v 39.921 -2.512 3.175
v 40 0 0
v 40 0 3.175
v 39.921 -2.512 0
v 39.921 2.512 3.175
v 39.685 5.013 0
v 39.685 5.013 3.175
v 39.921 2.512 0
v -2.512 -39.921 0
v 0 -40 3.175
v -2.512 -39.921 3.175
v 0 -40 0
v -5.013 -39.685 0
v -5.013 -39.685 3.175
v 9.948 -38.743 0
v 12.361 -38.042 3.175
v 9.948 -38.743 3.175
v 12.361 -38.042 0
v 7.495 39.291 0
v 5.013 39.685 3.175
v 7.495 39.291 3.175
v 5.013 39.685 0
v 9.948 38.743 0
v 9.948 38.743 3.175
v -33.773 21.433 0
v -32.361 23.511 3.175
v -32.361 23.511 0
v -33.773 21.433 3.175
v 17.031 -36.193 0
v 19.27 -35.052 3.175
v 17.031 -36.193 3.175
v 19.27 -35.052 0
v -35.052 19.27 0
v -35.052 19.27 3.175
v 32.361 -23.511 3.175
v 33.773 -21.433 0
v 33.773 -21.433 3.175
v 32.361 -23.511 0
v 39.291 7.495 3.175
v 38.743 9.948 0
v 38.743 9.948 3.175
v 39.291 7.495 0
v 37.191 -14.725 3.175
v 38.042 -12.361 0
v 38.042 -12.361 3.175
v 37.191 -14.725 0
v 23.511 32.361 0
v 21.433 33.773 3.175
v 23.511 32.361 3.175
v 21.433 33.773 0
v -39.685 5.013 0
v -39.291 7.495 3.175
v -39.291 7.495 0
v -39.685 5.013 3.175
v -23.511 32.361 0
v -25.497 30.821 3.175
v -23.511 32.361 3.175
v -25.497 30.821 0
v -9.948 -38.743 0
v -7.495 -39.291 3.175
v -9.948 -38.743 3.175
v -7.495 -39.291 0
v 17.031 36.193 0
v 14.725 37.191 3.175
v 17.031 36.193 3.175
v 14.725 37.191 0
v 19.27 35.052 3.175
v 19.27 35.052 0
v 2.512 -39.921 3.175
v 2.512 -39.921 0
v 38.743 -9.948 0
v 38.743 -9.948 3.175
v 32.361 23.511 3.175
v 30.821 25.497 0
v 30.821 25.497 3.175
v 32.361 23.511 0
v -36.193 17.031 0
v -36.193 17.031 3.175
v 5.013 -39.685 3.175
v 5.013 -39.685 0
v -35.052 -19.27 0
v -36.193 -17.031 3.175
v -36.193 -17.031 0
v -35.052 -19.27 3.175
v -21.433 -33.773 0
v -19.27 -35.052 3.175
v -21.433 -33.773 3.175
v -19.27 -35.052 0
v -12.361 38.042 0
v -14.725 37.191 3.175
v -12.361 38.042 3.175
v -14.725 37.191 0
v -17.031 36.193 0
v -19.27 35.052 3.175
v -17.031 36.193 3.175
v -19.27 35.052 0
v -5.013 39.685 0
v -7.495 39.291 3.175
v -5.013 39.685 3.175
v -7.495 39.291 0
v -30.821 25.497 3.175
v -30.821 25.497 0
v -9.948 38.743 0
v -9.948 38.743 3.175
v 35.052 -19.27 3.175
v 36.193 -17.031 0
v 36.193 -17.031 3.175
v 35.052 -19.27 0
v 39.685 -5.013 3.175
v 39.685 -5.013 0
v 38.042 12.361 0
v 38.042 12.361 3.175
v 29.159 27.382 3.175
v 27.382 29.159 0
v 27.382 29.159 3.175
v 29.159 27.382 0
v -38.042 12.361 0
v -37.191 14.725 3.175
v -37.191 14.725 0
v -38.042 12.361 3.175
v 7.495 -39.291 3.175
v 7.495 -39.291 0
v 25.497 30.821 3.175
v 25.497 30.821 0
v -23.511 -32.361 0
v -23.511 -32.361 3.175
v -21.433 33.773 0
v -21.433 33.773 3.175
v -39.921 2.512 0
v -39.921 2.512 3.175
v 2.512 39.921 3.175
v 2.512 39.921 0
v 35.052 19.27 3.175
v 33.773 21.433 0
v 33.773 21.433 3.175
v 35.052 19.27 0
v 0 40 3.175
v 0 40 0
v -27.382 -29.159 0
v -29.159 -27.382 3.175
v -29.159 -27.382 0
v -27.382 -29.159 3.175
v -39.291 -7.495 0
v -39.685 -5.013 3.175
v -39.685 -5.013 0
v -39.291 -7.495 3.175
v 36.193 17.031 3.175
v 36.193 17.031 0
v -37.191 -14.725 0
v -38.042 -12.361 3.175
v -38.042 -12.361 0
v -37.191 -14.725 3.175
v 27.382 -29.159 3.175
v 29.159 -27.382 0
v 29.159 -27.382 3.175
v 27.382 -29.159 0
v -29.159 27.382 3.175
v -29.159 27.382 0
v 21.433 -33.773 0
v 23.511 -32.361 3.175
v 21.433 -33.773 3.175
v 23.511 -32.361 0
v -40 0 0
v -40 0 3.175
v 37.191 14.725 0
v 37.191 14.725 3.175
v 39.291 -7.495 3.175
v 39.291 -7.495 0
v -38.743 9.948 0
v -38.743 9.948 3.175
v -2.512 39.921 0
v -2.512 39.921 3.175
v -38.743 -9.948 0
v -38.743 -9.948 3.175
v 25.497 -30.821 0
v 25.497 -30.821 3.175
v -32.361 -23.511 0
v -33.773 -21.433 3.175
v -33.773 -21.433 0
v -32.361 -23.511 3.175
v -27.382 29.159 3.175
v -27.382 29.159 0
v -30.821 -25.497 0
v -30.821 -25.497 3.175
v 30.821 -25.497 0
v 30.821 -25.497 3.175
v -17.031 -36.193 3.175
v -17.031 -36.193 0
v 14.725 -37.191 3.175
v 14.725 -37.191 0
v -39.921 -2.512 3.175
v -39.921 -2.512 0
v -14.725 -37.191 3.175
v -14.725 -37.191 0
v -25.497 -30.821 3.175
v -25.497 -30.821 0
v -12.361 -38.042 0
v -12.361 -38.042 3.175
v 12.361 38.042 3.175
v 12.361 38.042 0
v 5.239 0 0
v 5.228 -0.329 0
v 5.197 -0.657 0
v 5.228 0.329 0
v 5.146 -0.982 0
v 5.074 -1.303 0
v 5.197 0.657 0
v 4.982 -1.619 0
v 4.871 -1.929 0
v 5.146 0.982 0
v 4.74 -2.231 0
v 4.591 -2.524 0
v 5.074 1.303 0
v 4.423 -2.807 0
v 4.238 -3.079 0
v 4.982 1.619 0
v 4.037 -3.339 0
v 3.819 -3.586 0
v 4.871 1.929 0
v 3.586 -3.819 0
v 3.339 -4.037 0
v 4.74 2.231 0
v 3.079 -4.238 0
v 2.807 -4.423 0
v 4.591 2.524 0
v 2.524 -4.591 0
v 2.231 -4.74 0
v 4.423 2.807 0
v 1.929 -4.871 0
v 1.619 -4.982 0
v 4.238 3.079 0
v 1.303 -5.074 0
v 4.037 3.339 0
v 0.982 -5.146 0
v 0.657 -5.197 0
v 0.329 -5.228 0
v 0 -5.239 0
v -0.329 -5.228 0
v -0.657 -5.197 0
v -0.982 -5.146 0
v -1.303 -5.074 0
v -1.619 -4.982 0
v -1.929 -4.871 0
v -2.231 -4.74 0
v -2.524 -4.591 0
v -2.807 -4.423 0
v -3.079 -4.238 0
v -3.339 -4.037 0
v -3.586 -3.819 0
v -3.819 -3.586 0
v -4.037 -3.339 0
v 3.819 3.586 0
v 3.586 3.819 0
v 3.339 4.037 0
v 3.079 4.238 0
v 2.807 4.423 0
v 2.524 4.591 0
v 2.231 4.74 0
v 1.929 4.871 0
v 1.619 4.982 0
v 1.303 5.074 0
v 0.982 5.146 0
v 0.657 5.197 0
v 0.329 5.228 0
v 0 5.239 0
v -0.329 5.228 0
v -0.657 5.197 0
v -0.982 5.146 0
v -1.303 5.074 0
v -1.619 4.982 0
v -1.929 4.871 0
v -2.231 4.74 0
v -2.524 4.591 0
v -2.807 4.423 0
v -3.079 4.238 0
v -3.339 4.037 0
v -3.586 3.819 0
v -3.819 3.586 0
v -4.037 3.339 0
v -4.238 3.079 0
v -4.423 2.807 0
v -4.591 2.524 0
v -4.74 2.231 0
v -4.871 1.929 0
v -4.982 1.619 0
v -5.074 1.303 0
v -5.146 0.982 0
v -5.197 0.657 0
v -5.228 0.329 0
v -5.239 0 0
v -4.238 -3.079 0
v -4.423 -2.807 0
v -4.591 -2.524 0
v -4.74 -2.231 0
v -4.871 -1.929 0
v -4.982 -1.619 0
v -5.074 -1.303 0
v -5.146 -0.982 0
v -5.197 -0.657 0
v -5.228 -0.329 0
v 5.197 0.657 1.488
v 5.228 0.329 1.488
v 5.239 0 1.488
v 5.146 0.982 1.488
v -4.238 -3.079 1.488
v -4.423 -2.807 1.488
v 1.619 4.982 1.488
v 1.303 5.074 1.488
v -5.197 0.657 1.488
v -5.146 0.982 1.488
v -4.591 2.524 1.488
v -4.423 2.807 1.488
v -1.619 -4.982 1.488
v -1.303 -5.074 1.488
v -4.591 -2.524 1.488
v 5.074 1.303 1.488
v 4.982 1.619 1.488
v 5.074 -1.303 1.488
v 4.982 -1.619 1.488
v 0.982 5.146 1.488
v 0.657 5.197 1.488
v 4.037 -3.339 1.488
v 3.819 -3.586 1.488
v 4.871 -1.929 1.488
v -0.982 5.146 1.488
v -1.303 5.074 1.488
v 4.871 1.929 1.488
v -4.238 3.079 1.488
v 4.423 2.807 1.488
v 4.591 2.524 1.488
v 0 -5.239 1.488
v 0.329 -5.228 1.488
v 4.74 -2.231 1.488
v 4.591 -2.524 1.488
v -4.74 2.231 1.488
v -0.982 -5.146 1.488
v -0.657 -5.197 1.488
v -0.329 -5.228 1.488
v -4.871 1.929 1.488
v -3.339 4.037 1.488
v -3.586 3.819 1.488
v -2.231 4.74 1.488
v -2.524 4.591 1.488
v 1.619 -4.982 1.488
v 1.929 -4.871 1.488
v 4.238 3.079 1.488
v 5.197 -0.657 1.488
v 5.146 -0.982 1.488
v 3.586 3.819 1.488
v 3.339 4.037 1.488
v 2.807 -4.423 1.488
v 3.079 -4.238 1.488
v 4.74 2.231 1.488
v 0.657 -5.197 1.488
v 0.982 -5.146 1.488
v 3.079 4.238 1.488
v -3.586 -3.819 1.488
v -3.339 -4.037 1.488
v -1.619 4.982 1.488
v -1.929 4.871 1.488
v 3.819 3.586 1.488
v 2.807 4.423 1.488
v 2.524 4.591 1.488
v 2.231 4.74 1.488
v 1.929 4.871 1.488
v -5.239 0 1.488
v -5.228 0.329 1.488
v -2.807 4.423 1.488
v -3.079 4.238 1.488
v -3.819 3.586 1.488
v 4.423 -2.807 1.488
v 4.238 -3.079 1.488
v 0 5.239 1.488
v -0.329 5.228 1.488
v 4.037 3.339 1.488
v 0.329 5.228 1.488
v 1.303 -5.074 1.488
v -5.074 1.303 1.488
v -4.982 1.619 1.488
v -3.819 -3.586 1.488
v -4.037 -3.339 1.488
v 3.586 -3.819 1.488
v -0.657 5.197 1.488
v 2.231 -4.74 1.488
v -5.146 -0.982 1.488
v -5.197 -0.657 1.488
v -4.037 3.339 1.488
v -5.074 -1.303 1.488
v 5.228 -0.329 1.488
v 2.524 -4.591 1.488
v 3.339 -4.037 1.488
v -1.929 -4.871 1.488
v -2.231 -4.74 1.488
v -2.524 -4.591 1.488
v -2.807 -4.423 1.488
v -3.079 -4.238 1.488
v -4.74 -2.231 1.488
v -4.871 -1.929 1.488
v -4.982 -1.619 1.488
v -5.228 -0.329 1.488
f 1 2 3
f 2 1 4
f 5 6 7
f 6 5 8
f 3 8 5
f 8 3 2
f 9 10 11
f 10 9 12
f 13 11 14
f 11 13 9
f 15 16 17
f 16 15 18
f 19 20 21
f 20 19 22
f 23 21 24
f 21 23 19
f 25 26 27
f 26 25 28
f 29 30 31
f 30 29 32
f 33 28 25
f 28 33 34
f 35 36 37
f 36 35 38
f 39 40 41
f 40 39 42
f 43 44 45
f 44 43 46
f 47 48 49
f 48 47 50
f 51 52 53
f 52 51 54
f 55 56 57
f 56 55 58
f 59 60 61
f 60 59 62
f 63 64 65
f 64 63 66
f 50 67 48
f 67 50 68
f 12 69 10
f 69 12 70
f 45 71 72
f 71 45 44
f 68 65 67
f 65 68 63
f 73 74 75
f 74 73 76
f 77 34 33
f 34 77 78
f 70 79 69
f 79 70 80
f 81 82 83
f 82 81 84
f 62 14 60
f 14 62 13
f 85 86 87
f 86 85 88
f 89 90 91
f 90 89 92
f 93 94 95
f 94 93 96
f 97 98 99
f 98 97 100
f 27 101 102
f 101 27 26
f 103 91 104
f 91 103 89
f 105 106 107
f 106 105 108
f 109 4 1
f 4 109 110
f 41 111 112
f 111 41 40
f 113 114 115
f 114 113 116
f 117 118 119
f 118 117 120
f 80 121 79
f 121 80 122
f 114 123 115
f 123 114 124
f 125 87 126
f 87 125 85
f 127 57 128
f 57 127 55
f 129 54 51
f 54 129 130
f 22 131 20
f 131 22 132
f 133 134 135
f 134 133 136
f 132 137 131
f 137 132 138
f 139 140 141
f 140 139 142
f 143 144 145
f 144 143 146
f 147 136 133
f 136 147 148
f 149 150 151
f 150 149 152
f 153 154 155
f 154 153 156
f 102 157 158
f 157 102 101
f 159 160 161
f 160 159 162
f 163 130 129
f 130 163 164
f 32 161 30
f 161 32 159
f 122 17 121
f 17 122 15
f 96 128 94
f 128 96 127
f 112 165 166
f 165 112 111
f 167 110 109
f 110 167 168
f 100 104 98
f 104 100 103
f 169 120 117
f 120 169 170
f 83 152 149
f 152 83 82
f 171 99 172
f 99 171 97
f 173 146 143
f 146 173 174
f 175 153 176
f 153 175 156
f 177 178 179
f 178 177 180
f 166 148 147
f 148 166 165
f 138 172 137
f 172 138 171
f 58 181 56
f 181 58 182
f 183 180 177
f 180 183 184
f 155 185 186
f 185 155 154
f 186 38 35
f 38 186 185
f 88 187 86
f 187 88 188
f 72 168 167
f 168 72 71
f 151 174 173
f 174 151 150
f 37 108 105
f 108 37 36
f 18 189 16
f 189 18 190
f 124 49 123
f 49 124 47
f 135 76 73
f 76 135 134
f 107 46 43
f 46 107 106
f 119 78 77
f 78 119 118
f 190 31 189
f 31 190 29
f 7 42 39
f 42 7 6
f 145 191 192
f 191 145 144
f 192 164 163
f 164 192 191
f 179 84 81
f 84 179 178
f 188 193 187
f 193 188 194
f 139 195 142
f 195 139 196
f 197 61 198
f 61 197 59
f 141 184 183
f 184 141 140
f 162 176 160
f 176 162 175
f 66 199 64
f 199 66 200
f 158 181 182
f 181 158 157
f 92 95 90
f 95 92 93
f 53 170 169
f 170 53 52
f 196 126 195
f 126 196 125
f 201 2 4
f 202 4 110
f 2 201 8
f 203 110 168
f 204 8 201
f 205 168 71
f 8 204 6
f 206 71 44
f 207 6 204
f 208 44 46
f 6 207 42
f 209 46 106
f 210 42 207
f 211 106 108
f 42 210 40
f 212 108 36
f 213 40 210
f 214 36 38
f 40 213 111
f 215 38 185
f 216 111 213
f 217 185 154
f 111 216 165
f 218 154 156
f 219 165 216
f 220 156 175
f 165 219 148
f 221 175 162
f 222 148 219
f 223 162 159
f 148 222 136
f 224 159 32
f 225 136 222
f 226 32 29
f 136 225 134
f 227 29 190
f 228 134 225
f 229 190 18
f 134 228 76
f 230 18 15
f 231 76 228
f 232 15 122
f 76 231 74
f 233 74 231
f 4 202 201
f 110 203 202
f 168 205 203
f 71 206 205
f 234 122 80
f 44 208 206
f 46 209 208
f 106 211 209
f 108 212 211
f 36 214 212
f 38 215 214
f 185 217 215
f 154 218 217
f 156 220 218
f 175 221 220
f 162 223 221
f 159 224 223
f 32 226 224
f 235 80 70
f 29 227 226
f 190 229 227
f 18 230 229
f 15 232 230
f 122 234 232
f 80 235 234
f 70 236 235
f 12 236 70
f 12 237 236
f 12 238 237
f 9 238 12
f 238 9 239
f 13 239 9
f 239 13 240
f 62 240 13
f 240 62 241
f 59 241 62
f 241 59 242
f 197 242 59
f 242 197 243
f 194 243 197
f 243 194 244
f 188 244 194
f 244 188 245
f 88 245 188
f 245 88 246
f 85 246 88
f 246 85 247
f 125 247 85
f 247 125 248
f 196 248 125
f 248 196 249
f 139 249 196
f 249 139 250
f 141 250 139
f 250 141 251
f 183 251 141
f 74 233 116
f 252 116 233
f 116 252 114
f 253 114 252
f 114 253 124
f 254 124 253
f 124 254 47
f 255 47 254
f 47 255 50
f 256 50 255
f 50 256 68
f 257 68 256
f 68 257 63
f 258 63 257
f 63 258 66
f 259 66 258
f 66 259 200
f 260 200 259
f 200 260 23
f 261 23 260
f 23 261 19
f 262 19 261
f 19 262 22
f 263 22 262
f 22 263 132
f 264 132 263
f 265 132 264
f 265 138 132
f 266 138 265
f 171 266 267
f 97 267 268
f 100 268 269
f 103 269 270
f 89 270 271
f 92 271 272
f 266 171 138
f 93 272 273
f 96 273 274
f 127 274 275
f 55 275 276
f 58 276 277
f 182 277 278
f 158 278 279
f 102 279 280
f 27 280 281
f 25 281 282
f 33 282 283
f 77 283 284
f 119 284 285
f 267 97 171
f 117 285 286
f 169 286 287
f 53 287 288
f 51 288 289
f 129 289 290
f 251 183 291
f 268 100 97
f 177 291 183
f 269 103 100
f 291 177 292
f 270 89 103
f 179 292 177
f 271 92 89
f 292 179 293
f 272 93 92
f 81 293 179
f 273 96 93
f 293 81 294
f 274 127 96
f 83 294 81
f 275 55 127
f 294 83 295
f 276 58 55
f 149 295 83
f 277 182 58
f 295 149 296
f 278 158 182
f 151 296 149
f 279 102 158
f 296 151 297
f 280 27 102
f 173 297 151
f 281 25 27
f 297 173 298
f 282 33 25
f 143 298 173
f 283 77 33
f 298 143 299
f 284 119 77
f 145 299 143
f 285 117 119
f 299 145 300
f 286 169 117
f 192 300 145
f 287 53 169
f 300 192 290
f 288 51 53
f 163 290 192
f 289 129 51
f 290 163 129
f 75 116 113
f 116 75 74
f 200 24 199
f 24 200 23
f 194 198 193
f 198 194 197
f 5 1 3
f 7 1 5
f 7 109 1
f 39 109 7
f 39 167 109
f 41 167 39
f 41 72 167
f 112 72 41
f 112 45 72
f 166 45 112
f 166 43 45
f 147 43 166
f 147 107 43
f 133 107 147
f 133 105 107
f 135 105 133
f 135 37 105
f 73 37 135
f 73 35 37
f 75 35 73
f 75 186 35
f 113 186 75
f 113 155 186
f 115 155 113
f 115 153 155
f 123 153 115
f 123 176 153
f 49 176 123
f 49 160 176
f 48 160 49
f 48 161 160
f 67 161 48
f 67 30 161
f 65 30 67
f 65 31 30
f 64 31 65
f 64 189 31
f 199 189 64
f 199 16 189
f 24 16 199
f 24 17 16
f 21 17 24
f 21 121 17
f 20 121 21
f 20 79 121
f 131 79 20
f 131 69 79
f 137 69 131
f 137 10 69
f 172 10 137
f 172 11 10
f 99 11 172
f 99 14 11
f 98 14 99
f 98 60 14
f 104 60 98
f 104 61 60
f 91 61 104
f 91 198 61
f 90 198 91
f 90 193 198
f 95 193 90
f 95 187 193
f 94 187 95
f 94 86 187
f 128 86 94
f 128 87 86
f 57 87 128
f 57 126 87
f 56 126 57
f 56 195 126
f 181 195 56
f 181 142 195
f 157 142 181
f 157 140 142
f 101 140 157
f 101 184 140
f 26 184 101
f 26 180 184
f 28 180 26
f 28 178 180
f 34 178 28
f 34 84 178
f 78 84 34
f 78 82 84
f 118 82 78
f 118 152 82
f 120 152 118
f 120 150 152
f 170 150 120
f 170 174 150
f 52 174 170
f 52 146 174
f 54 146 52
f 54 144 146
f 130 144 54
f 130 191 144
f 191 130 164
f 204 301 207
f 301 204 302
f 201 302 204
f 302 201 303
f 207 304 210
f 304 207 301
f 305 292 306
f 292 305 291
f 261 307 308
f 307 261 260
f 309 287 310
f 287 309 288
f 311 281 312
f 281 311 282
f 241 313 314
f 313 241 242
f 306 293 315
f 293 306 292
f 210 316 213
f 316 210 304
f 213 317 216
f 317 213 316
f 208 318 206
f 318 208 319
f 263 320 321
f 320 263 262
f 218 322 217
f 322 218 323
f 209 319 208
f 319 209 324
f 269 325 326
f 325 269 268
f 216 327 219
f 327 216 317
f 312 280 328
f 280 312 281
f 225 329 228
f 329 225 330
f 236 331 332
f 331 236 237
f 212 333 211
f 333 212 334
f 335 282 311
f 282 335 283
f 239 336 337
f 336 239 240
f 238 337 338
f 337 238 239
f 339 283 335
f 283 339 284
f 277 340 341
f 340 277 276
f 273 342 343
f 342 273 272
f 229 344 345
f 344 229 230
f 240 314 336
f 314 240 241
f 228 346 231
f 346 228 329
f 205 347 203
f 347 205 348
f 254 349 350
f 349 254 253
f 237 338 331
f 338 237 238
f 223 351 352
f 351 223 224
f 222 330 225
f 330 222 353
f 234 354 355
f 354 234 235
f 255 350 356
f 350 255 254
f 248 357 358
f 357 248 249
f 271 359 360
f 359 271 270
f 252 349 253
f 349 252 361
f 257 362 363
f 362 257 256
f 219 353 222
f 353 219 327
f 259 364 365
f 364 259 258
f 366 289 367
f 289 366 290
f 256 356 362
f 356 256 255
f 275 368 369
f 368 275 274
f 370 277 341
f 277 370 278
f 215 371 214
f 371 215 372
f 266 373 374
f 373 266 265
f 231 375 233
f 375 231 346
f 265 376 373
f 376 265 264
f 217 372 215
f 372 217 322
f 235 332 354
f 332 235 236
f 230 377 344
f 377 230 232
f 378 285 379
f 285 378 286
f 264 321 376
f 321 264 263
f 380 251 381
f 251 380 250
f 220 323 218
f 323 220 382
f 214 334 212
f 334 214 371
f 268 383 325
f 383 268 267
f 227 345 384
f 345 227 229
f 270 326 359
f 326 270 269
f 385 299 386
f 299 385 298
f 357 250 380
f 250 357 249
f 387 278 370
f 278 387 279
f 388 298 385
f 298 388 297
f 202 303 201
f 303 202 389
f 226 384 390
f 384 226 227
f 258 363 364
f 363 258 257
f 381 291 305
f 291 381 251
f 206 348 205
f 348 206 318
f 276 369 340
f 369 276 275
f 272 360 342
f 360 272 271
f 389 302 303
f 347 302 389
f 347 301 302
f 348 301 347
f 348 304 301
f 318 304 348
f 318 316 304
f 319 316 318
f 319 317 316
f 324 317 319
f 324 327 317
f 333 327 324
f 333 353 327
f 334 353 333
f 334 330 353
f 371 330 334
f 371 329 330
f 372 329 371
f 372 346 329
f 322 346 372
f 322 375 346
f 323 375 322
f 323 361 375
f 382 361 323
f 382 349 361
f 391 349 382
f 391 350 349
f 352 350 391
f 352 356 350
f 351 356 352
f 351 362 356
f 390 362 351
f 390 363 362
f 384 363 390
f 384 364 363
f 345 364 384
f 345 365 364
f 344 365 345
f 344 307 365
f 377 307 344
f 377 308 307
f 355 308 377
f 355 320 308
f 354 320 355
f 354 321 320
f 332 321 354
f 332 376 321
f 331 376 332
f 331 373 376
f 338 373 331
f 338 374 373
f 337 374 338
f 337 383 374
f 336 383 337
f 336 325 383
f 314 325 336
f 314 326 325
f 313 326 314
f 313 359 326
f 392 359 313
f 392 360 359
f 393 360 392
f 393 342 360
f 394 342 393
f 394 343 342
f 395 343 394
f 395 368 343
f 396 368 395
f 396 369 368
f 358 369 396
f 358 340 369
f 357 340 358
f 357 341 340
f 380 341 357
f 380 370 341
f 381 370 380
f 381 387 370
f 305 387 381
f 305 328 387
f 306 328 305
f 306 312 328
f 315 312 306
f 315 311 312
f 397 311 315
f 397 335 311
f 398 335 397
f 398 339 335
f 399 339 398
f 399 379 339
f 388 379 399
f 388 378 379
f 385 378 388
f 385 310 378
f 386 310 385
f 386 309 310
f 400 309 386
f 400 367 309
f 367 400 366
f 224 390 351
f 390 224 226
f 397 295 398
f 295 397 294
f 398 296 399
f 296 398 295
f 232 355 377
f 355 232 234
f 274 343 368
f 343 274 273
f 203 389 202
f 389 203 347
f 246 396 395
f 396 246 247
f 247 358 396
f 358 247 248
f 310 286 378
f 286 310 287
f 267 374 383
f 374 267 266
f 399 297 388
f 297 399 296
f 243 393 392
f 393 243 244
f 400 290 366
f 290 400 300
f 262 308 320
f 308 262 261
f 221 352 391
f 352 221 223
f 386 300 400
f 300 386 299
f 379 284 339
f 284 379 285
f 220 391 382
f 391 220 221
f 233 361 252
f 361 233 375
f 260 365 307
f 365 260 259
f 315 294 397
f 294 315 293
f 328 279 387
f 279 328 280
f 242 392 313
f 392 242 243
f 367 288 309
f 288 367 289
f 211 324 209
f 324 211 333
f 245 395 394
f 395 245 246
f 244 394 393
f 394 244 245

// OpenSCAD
inch = 25.4;
$fn = 100;

difference() {
    cylinder(h = inch * 1/8, r = 40);
    cylinder(h = inch * 15/256, r = 1.1 * inch * 3/16);
}
